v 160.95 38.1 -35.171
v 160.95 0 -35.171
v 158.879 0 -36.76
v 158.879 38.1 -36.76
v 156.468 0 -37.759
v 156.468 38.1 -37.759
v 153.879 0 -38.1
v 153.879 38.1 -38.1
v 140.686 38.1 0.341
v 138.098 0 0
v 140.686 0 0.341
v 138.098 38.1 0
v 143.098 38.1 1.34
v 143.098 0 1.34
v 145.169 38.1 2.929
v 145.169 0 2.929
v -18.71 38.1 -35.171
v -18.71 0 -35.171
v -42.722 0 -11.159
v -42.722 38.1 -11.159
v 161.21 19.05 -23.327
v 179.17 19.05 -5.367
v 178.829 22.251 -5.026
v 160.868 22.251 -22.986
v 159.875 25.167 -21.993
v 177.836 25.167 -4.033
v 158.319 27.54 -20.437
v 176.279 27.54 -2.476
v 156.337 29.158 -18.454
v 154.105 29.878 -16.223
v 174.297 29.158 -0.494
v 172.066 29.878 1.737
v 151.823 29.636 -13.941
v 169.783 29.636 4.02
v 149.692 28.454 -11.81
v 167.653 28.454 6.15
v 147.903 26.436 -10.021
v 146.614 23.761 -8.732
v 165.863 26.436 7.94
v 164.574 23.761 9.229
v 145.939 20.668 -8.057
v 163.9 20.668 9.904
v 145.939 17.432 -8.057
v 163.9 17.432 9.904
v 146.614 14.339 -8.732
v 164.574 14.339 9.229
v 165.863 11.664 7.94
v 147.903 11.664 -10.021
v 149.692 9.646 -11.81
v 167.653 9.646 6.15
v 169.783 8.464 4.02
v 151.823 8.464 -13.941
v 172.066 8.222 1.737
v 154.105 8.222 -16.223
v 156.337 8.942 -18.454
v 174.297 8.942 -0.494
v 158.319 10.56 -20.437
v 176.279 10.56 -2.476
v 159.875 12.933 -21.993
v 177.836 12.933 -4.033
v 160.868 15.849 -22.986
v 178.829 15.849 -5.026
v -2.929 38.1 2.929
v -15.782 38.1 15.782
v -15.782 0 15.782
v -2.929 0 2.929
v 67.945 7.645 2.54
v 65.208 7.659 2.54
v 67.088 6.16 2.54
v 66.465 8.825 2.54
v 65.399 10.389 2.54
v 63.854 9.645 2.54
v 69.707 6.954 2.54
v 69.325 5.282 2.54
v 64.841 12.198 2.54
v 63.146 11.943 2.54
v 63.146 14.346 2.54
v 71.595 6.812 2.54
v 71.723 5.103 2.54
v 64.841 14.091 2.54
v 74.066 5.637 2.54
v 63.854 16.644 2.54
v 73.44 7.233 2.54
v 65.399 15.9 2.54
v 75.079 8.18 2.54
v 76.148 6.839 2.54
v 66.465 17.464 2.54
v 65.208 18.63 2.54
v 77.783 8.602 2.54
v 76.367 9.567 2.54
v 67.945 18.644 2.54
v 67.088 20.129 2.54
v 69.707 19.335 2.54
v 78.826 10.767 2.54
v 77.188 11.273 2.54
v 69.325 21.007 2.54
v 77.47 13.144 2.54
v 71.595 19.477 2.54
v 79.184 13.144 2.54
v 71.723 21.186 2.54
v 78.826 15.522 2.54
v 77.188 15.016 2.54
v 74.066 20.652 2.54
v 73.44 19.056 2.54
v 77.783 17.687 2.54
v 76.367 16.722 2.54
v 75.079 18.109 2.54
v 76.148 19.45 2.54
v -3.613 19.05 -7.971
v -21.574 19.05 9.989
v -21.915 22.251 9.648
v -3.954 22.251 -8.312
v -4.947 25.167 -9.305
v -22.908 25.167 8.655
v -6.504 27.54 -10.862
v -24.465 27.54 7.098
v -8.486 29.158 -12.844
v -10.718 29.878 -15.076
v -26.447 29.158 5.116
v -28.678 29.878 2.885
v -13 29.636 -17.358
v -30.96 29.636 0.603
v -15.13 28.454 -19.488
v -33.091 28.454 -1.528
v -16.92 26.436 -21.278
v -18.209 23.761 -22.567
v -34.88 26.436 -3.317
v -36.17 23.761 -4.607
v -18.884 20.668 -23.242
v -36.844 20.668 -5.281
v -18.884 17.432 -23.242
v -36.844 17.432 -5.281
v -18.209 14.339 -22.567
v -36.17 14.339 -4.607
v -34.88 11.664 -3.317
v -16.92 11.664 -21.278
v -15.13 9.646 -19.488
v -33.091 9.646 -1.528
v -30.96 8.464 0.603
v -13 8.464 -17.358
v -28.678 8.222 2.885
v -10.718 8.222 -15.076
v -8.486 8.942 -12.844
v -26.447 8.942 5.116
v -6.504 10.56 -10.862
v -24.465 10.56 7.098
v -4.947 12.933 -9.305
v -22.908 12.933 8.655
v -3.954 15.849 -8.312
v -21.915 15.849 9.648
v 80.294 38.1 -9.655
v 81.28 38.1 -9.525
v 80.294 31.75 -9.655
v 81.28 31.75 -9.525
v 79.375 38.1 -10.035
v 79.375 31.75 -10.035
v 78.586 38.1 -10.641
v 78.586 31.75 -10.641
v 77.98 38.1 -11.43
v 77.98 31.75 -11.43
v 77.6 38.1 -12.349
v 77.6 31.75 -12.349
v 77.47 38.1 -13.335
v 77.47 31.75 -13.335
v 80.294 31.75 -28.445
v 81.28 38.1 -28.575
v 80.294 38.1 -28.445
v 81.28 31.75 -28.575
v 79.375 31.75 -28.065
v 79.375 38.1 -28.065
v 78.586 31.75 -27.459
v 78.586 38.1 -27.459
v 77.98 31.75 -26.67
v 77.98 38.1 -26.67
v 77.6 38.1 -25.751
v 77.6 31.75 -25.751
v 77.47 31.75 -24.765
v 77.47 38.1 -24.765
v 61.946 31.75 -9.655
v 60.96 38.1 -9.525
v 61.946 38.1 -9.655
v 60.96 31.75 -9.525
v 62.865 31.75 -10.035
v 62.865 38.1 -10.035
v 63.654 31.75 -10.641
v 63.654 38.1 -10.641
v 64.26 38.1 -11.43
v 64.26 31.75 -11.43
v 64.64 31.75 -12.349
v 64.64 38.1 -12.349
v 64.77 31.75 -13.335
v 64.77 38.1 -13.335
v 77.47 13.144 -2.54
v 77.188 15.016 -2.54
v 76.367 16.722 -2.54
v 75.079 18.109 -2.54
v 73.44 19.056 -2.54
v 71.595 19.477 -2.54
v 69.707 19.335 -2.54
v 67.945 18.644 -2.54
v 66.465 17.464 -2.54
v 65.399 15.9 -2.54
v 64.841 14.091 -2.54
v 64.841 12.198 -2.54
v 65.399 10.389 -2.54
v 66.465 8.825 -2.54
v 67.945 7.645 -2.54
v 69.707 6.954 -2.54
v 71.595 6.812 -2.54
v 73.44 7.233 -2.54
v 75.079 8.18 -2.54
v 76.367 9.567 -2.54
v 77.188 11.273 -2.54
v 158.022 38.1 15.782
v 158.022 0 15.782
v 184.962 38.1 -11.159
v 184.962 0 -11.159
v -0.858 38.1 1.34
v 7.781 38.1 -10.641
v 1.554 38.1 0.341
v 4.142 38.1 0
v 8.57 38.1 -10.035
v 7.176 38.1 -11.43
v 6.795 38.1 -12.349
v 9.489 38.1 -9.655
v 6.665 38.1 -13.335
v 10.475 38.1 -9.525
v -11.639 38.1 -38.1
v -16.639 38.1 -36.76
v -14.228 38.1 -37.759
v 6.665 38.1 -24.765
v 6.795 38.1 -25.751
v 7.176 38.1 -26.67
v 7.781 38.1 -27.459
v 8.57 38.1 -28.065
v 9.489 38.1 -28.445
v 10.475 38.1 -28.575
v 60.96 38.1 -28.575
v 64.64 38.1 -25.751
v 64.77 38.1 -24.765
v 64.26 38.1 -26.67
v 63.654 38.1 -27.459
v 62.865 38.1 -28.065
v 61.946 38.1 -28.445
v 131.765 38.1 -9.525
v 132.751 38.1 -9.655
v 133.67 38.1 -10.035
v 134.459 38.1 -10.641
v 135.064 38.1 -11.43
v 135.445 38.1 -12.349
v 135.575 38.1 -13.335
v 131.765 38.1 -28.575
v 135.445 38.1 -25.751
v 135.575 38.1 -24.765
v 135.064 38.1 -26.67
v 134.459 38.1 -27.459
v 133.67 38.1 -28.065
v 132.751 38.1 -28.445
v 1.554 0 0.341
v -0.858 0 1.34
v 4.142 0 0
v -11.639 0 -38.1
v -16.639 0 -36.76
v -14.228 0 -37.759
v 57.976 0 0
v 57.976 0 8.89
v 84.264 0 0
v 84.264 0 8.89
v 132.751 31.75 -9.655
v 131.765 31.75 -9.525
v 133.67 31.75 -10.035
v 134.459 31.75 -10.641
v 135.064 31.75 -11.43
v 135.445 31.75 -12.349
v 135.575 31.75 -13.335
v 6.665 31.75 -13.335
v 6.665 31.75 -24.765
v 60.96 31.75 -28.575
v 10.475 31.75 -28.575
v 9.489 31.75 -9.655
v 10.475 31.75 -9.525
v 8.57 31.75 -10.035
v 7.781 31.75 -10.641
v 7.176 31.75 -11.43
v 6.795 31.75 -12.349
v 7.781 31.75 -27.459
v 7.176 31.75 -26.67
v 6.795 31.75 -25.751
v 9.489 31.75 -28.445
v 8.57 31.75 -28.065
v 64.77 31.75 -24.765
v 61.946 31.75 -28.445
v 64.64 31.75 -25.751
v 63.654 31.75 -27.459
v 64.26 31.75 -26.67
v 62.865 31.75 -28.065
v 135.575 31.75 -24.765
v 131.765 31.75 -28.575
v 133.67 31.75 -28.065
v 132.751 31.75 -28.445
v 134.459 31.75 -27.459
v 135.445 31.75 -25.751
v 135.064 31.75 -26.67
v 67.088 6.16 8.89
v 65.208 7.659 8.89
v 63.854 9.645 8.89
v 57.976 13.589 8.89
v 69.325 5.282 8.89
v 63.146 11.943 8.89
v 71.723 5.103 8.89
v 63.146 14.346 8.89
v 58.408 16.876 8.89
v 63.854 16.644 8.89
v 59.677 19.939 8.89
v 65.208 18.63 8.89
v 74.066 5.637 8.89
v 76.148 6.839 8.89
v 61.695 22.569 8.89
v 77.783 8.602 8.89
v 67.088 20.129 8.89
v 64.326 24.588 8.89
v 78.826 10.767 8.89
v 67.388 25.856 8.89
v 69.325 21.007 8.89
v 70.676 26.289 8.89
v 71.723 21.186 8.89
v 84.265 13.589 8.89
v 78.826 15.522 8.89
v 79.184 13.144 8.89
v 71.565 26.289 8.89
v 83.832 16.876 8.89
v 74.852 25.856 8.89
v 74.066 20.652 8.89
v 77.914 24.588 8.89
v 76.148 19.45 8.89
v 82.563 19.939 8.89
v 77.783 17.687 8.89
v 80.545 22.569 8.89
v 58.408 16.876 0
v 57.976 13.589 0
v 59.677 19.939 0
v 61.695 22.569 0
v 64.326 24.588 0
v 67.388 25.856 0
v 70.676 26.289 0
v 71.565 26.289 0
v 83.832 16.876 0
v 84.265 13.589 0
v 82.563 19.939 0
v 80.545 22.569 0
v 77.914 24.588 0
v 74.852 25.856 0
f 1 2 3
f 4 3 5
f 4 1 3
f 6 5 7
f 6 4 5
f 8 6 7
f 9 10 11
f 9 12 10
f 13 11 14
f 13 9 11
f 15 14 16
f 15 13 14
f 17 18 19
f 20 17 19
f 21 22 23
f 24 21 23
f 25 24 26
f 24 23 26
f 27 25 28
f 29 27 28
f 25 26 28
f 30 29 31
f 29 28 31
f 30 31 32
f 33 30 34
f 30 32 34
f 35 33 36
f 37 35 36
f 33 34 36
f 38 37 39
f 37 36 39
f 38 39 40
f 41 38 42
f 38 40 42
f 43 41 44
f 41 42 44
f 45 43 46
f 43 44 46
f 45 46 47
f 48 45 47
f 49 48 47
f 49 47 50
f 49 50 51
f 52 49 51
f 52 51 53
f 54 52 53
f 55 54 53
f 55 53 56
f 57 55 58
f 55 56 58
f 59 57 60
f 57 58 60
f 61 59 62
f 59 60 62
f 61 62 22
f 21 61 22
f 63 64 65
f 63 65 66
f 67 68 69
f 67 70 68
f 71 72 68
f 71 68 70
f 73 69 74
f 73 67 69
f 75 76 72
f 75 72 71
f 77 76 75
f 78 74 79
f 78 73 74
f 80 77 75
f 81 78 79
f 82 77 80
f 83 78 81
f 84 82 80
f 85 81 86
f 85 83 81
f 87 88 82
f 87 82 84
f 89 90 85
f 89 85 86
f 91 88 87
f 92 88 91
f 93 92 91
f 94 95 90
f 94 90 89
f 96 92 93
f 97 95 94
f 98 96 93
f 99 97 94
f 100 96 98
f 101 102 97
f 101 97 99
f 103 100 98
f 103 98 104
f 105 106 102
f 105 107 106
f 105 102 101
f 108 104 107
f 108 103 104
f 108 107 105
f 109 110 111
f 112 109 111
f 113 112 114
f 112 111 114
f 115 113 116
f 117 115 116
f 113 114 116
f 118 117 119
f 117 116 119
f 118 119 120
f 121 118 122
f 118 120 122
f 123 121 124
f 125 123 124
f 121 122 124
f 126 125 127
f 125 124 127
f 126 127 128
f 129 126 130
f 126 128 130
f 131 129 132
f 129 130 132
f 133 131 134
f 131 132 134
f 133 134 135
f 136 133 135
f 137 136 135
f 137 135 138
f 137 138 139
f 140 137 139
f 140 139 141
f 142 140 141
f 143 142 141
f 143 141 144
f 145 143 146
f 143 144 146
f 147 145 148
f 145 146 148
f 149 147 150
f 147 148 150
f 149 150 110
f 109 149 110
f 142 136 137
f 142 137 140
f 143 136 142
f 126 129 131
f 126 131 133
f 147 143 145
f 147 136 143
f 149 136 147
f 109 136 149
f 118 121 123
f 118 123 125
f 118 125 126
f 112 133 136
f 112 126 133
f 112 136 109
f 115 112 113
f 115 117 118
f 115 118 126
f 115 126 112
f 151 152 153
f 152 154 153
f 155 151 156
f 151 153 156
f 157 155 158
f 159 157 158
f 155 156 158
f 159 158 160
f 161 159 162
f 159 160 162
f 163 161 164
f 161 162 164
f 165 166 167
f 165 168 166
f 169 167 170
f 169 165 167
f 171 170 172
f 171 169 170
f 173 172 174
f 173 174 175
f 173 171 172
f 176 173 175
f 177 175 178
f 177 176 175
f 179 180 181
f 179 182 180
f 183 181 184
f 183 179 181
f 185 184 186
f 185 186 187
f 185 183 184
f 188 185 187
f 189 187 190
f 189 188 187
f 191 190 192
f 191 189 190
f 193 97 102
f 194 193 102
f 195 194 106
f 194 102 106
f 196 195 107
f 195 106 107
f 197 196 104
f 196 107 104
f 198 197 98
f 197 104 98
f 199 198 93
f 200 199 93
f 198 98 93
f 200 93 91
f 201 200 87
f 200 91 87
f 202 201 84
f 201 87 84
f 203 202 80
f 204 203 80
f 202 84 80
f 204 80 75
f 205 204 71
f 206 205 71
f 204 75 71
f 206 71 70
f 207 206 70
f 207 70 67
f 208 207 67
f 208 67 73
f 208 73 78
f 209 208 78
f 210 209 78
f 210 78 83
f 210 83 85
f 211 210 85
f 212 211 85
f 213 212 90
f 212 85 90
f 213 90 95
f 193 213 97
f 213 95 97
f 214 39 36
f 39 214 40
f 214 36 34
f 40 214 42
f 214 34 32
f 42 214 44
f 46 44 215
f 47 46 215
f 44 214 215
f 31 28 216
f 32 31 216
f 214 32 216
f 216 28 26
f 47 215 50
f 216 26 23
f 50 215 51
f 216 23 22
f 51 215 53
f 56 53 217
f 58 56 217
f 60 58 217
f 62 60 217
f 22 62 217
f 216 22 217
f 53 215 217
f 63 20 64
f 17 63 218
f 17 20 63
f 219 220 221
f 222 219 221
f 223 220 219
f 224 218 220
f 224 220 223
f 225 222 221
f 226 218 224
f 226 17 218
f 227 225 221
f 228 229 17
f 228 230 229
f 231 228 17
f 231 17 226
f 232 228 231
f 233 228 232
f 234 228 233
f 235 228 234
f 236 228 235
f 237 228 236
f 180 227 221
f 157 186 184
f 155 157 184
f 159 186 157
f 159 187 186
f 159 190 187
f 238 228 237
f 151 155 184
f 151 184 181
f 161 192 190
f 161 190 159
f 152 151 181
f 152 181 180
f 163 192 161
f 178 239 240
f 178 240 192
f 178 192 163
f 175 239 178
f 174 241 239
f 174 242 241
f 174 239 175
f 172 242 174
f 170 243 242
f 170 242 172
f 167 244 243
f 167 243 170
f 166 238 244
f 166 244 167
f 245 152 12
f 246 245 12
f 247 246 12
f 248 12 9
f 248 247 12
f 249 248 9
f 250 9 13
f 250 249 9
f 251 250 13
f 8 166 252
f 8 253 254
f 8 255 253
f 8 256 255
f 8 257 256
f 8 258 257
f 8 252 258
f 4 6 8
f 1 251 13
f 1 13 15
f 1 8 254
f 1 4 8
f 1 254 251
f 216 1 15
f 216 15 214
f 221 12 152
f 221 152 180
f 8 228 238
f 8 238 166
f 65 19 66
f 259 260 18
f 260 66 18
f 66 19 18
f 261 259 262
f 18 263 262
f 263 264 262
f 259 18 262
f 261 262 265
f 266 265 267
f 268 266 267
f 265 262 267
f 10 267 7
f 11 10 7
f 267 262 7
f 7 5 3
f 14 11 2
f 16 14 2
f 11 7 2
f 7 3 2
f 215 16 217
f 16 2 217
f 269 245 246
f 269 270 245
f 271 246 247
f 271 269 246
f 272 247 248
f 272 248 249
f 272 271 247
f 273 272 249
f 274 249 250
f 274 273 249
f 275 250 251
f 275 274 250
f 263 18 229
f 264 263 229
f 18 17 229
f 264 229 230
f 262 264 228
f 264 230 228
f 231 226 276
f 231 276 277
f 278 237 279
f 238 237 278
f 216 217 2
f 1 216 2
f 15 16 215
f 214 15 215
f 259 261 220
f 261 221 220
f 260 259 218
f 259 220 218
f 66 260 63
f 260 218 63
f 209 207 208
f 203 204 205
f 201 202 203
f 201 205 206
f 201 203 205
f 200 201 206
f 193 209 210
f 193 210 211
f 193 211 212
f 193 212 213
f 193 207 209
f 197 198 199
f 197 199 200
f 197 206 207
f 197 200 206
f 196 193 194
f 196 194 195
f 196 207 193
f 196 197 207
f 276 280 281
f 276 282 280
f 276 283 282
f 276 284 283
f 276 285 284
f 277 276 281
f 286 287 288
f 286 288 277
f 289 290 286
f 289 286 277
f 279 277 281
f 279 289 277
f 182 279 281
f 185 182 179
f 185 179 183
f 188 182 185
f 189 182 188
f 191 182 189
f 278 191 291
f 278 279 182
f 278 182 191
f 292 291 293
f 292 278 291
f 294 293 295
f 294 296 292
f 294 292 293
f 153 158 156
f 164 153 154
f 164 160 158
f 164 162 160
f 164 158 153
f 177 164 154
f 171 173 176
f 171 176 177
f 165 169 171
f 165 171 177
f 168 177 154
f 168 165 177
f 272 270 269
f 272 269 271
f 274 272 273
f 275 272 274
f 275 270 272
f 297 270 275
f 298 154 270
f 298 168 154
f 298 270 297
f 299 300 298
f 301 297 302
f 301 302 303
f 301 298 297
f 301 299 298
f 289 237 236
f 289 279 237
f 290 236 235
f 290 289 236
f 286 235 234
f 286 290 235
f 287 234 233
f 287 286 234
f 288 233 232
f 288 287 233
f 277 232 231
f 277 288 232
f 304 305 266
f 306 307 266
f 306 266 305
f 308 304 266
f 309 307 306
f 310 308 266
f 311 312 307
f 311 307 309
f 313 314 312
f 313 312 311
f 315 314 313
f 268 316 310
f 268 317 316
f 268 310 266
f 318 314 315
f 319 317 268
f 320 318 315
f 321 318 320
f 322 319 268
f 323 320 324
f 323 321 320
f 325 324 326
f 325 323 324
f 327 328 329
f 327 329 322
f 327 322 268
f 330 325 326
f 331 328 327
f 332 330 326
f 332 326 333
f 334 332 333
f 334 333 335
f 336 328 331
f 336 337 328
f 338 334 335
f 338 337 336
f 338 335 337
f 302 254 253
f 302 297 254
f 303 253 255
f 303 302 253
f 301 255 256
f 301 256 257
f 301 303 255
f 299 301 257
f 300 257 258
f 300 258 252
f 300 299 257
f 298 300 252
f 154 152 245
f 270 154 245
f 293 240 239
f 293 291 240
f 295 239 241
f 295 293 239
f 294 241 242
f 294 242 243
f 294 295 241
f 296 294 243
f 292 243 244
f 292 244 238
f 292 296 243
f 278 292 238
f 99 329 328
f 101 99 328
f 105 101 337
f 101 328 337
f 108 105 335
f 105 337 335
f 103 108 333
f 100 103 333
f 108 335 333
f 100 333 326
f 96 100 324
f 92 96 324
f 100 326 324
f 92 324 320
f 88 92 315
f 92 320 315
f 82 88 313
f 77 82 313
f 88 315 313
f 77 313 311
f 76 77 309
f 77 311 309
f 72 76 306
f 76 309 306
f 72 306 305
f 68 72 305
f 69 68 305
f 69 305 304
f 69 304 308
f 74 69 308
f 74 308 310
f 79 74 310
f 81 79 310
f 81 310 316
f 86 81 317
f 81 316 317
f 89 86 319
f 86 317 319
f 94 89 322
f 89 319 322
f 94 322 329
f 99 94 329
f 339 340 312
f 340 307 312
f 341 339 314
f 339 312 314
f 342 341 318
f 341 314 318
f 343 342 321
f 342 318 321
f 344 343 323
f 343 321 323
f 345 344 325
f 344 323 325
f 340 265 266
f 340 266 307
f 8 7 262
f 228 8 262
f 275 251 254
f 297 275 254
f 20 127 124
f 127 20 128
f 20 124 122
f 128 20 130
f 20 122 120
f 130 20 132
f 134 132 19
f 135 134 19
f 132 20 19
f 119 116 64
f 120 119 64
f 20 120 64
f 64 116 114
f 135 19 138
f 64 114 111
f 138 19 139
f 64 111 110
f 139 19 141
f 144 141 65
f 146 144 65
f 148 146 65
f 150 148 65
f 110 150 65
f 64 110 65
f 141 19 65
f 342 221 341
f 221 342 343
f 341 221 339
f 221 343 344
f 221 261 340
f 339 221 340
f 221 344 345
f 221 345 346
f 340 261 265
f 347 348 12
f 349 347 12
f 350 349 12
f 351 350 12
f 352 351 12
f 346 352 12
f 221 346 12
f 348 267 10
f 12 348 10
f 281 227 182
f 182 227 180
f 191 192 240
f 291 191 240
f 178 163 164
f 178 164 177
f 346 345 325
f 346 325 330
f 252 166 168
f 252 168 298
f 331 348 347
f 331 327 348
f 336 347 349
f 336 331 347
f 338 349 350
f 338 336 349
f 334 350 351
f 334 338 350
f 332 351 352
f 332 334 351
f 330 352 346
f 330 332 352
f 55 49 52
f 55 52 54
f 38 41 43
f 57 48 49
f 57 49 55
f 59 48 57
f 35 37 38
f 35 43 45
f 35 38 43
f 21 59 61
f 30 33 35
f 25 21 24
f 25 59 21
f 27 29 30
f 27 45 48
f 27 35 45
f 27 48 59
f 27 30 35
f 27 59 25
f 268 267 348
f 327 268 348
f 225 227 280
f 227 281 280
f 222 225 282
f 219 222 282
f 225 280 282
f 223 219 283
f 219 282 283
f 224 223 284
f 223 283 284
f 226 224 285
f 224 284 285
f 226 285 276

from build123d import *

# Parameters (mm, degrees)
BOSS_EXTRUDE1_DEPTH = 38.1
SKETCH2_R           = 10.8585
CUT_EXTRUDE1_DEPTH  = 25.4
SKETCH3_R           = 10.8585
CUT_EXTRUDE2_DEPTH  = 25.4
FILLET1_R           = 10
FILLET2_R           = 10
SKETCH5_W           = 26.289
SKETCH5_H           = 26.289
BOSS_EXTRUDE2_DEPTH = 8.89
SKETCH6_R           = 8.0645
CUT_EXTRUDE3_DEPTH  = 6.35
SKETCH7_R           = 6.35
CUT_EXTRUDE4_DEPTH  = 5.08
FILLET3_R           = 12.7
SKETCH8_W           = 58.1046987
SKETCH8_H           = 19.05
CUT_EXTRUDE5_DEPTH  = 6.35
FILLET4_R           = 3.81


with BuildPart() as part:
    # Sketch1 → Boss-Extrude1 (new body)
    with BuildSketch(Plane(origin=(0, 0, 0), x_dir=(1, 0, 0), z_dir=(0, 1, 0))):
        Polygon((0, 0), (142.24, 0), (158.021536726, -15.781536726), (184.96230509, 11.159231637), (158.021536726, 38.1), (-15.781536726, 38.1), (-42.72230509, 11.159231637), (-15.781536726, -15.781536726), align=None)
    extrude(amount=BOSS_EXTRUDE1_DEPTH)

    # Sketch2 → Cut-Extrude1 (cut)
    with BuildSketch(Plane(origin=(-15.781536726, 0, 15.781536726), x_dir=(0.7071067811865477, 0, 0.7071067811865475), z_dir=(-0.7071067811865475, 0, 0.7071067811865477))):
        with Locations((-19.05, 19.05)):
            Circle(SKETCH2_R)
    extrude(amount=-CUT_EXTRUDE1_DEPTH, mode=Mode.SUBTRACT)

    # Sketch3 → Cut-Extrude2 (cut)
    with BuildSketch(Plane(origin=(86.901536726, 0, 86.901536726), x_dir=(0.7071067811865478, 0, -0.7071067811865474), z_dir=(0.7071067811865474, 0, 0.7071067811865478))):
        with Locations((119.628868556, 19.05)):
            Circle(SKETCH3_R)
    extrude(amount=-CUT_EXTRUDE2_DEPTH, mode=Mode.SUBTRACT)

    # Fillet1
    fillet1_edges = [part.edges().sort_by_distance(p)[0] for p in [
        (142.24, 19.05, 0),
        (0, 19.05, 0),
    ]]
    fillet(fillet1_edges, radius=FILLET1_R)

    # Fillet2
    fillet2_edges = [part.edges().sort_by_distance(p)[0] for p in [
        (-15.781536726, 19.05, -38.1),
        (158.021536726, 19.05, -38.1),
    ]]
    fillet(fillet2_edges, radius=FILLET2_R)

    # Sketch5 → Boss-Extrude2 (add)
    with BuildSketch(Plane.XY):
        with Locations((71.12, 13.1445)):
            Rectangle(SKETCH5_W, SKETCH5_H)
    extrude(amount=BOSS_EXTRUDE2_DEPTH)

    # Sketch6 → Cut-Extrude3 (cut)
    with BuildSketch(Plane.XY.offset(8.89)):
        with Locations((71.12, 13.1445)):
            Circle(SKETCH6_R)
    extrude(amount=-CUT_EXTRUDE3_DEPTH, mode=Mode.SUBTRACT)

    # Sketch7 → Cut-Extrude4 (cut)
    with BuildSketch(Plane.XY.offset(2.54)):
        with Locations((71.12, 13.1445)):
            Circle(SKETCH7_R)
    extrude(amount=-CUT_EXTRUDE4_DEPTH, mode=Mode.SUBTRACT)

    # Fillet3
    fillet3_edges = [part.edges().sort_by_distance(p)[0] for p in [
        (57.9755, 26.289, 4.445),
        (84.2645, 26.289, 4.445),
    ]]
    fillet(fillet3_edges, radius=FILLET3_R)

    # Sketch8 → Cut-Extrude5 (cut)
    with BuildSketch(Plane(origin=(0, 38.1, 0), x_dir=(1, 0, 0), z_dir=(0, 1, 0))):
        with Locations((35.71765065, 19.05)):
            Rectangle(SKETCH8_W, SKETCH8_H)
        with Locations((106.52234935, 19.05)):
            Rectangle(SKETCH8_W, SKETCH8_H)
    extrude(amount=-CUT_EXTRUDE5_DEPTH, mode=Mode.SUBTRACT)

    # Fillet4
    fillet4_edges = [part.edges().sort_by_distance(p)[0] for p in [
        (6.6653013, 34.925, -9.525),
        (6.6653013, 34.925, -28.575),
        (64.77, 34.925, -28.575),
        (64.77, 34.925, -9.525),
        (135.5746987, 34.925, -28.575),
        (135.5746987, 34.925, -9.525),
        (77.47, 34.925, -9.525),
        (77.47, 34.925, -28.575),
    ]]
    fillet(fillet4_edges, radius=FILLET4_R)


solid = part.part
